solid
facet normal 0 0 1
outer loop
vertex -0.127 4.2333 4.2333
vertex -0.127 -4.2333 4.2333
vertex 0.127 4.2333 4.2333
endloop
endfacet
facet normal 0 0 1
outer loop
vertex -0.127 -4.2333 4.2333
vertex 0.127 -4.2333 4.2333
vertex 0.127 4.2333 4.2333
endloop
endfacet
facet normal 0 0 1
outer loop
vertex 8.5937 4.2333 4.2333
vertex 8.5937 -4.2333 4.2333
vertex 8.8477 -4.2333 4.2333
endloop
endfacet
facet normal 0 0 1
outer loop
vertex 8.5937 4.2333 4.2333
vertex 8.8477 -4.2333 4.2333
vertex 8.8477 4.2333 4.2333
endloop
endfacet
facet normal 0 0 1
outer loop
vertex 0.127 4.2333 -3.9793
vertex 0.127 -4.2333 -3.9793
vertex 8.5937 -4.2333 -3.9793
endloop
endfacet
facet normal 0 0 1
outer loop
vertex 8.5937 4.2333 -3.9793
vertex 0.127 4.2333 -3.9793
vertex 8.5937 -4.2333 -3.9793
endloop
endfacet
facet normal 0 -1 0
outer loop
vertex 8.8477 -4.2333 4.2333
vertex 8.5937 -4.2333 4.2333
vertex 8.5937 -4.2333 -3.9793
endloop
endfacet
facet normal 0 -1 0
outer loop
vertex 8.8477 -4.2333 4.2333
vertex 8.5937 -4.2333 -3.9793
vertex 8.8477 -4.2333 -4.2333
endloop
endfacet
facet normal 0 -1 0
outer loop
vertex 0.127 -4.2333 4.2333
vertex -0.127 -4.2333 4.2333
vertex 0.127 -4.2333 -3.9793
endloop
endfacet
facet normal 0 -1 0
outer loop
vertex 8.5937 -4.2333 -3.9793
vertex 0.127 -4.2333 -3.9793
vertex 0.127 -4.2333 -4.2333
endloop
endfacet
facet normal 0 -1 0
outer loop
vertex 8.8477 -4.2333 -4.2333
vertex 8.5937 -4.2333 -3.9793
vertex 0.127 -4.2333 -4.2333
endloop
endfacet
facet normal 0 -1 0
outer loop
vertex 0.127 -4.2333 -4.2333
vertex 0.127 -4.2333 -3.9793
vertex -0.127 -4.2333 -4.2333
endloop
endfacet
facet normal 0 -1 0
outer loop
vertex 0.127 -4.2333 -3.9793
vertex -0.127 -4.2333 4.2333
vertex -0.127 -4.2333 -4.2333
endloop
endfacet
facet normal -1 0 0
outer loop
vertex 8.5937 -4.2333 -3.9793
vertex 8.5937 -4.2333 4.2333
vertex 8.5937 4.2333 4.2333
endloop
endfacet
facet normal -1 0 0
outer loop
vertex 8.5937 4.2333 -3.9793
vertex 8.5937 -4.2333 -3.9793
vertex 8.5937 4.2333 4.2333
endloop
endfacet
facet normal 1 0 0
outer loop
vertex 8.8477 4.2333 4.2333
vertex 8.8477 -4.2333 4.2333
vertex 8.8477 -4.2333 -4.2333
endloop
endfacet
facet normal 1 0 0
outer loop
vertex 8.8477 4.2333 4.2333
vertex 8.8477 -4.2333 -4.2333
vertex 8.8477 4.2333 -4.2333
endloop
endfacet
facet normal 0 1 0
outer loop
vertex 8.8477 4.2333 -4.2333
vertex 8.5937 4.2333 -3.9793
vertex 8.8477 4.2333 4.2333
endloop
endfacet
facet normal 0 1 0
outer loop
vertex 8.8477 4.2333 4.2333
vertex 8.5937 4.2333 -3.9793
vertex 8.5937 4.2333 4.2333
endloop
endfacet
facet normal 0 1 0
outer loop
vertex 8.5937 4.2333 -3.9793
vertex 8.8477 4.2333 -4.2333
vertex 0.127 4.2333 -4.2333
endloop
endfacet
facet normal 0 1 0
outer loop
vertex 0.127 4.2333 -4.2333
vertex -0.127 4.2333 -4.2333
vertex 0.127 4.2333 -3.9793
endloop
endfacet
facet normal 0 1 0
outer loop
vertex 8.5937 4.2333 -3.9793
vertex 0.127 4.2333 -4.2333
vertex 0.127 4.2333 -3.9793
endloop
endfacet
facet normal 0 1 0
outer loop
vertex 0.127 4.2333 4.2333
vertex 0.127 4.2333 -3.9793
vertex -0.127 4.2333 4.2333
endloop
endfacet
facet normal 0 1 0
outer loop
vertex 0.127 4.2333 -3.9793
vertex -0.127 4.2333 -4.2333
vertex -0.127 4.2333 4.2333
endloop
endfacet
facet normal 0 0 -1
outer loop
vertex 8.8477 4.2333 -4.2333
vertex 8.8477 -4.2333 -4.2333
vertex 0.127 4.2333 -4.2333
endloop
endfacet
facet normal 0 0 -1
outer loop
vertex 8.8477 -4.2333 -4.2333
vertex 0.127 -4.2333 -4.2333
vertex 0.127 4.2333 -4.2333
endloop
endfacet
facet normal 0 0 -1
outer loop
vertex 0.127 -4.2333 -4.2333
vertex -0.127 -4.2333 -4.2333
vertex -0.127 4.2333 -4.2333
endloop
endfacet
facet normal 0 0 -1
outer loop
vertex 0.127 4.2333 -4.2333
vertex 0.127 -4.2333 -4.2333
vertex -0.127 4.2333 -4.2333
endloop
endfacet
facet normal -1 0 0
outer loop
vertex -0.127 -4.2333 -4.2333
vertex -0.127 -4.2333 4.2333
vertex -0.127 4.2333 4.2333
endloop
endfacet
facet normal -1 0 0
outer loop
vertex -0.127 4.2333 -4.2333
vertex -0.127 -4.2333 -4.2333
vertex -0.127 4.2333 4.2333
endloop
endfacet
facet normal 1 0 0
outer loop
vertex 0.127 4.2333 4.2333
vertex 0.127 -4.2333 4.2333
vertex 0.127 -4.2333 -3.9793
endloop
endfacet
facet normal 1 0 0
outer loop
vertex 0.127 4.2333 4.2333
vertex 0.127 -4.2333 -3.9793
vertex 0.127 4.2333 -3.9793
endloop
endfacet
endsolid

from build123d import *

# Parameters (mm, degrees)
F0_W     = 8.4666666667
F0_H     = 8.4666666667
F1_DEPTH = 0.127
F2_W     = 8.4666666667
F2_H     = 8.4666666667
F3_DEPTH = 0.254
F4_W     = 8.4666666667
F4_H     = 8.2126666667
F4_H_2   = 0.254
F5_DEPTH = 0.254


with BuildPart() as f1:
    # F0 (on Right) → F1 (new body, symmetric)
    with BuildSketch(Plane.YZ):
        Rectangle(F0_W, F0_H)
    extrude(amount=F1_DEPTH, both=True)

    # F2 (on face) → F3 (join)
    with BuildSketch(Plane(origin=(0, 0, -4.2333333333), x_dir=(1, 0, 0), z_dir=(0, 0, -1))):
        with Locations((4.3603333333, 0)):
            Rectangle(F2_W, F2_H)
    extrude(amount=-F3_DEPTH)

    # F4 (on face) → F5 (join)
    with BuildSketch(Plane.YZ.offset(8.5936666667)):
        with Locations((0, 0.127)):
            Rectangle(F4_W, F4_H)
        with Locations((0, -4.1063333333)):
            Rectangle(F4_W, F4_H_2)
    extrude(amount=F5_DEPTH)


solid = f1.part
